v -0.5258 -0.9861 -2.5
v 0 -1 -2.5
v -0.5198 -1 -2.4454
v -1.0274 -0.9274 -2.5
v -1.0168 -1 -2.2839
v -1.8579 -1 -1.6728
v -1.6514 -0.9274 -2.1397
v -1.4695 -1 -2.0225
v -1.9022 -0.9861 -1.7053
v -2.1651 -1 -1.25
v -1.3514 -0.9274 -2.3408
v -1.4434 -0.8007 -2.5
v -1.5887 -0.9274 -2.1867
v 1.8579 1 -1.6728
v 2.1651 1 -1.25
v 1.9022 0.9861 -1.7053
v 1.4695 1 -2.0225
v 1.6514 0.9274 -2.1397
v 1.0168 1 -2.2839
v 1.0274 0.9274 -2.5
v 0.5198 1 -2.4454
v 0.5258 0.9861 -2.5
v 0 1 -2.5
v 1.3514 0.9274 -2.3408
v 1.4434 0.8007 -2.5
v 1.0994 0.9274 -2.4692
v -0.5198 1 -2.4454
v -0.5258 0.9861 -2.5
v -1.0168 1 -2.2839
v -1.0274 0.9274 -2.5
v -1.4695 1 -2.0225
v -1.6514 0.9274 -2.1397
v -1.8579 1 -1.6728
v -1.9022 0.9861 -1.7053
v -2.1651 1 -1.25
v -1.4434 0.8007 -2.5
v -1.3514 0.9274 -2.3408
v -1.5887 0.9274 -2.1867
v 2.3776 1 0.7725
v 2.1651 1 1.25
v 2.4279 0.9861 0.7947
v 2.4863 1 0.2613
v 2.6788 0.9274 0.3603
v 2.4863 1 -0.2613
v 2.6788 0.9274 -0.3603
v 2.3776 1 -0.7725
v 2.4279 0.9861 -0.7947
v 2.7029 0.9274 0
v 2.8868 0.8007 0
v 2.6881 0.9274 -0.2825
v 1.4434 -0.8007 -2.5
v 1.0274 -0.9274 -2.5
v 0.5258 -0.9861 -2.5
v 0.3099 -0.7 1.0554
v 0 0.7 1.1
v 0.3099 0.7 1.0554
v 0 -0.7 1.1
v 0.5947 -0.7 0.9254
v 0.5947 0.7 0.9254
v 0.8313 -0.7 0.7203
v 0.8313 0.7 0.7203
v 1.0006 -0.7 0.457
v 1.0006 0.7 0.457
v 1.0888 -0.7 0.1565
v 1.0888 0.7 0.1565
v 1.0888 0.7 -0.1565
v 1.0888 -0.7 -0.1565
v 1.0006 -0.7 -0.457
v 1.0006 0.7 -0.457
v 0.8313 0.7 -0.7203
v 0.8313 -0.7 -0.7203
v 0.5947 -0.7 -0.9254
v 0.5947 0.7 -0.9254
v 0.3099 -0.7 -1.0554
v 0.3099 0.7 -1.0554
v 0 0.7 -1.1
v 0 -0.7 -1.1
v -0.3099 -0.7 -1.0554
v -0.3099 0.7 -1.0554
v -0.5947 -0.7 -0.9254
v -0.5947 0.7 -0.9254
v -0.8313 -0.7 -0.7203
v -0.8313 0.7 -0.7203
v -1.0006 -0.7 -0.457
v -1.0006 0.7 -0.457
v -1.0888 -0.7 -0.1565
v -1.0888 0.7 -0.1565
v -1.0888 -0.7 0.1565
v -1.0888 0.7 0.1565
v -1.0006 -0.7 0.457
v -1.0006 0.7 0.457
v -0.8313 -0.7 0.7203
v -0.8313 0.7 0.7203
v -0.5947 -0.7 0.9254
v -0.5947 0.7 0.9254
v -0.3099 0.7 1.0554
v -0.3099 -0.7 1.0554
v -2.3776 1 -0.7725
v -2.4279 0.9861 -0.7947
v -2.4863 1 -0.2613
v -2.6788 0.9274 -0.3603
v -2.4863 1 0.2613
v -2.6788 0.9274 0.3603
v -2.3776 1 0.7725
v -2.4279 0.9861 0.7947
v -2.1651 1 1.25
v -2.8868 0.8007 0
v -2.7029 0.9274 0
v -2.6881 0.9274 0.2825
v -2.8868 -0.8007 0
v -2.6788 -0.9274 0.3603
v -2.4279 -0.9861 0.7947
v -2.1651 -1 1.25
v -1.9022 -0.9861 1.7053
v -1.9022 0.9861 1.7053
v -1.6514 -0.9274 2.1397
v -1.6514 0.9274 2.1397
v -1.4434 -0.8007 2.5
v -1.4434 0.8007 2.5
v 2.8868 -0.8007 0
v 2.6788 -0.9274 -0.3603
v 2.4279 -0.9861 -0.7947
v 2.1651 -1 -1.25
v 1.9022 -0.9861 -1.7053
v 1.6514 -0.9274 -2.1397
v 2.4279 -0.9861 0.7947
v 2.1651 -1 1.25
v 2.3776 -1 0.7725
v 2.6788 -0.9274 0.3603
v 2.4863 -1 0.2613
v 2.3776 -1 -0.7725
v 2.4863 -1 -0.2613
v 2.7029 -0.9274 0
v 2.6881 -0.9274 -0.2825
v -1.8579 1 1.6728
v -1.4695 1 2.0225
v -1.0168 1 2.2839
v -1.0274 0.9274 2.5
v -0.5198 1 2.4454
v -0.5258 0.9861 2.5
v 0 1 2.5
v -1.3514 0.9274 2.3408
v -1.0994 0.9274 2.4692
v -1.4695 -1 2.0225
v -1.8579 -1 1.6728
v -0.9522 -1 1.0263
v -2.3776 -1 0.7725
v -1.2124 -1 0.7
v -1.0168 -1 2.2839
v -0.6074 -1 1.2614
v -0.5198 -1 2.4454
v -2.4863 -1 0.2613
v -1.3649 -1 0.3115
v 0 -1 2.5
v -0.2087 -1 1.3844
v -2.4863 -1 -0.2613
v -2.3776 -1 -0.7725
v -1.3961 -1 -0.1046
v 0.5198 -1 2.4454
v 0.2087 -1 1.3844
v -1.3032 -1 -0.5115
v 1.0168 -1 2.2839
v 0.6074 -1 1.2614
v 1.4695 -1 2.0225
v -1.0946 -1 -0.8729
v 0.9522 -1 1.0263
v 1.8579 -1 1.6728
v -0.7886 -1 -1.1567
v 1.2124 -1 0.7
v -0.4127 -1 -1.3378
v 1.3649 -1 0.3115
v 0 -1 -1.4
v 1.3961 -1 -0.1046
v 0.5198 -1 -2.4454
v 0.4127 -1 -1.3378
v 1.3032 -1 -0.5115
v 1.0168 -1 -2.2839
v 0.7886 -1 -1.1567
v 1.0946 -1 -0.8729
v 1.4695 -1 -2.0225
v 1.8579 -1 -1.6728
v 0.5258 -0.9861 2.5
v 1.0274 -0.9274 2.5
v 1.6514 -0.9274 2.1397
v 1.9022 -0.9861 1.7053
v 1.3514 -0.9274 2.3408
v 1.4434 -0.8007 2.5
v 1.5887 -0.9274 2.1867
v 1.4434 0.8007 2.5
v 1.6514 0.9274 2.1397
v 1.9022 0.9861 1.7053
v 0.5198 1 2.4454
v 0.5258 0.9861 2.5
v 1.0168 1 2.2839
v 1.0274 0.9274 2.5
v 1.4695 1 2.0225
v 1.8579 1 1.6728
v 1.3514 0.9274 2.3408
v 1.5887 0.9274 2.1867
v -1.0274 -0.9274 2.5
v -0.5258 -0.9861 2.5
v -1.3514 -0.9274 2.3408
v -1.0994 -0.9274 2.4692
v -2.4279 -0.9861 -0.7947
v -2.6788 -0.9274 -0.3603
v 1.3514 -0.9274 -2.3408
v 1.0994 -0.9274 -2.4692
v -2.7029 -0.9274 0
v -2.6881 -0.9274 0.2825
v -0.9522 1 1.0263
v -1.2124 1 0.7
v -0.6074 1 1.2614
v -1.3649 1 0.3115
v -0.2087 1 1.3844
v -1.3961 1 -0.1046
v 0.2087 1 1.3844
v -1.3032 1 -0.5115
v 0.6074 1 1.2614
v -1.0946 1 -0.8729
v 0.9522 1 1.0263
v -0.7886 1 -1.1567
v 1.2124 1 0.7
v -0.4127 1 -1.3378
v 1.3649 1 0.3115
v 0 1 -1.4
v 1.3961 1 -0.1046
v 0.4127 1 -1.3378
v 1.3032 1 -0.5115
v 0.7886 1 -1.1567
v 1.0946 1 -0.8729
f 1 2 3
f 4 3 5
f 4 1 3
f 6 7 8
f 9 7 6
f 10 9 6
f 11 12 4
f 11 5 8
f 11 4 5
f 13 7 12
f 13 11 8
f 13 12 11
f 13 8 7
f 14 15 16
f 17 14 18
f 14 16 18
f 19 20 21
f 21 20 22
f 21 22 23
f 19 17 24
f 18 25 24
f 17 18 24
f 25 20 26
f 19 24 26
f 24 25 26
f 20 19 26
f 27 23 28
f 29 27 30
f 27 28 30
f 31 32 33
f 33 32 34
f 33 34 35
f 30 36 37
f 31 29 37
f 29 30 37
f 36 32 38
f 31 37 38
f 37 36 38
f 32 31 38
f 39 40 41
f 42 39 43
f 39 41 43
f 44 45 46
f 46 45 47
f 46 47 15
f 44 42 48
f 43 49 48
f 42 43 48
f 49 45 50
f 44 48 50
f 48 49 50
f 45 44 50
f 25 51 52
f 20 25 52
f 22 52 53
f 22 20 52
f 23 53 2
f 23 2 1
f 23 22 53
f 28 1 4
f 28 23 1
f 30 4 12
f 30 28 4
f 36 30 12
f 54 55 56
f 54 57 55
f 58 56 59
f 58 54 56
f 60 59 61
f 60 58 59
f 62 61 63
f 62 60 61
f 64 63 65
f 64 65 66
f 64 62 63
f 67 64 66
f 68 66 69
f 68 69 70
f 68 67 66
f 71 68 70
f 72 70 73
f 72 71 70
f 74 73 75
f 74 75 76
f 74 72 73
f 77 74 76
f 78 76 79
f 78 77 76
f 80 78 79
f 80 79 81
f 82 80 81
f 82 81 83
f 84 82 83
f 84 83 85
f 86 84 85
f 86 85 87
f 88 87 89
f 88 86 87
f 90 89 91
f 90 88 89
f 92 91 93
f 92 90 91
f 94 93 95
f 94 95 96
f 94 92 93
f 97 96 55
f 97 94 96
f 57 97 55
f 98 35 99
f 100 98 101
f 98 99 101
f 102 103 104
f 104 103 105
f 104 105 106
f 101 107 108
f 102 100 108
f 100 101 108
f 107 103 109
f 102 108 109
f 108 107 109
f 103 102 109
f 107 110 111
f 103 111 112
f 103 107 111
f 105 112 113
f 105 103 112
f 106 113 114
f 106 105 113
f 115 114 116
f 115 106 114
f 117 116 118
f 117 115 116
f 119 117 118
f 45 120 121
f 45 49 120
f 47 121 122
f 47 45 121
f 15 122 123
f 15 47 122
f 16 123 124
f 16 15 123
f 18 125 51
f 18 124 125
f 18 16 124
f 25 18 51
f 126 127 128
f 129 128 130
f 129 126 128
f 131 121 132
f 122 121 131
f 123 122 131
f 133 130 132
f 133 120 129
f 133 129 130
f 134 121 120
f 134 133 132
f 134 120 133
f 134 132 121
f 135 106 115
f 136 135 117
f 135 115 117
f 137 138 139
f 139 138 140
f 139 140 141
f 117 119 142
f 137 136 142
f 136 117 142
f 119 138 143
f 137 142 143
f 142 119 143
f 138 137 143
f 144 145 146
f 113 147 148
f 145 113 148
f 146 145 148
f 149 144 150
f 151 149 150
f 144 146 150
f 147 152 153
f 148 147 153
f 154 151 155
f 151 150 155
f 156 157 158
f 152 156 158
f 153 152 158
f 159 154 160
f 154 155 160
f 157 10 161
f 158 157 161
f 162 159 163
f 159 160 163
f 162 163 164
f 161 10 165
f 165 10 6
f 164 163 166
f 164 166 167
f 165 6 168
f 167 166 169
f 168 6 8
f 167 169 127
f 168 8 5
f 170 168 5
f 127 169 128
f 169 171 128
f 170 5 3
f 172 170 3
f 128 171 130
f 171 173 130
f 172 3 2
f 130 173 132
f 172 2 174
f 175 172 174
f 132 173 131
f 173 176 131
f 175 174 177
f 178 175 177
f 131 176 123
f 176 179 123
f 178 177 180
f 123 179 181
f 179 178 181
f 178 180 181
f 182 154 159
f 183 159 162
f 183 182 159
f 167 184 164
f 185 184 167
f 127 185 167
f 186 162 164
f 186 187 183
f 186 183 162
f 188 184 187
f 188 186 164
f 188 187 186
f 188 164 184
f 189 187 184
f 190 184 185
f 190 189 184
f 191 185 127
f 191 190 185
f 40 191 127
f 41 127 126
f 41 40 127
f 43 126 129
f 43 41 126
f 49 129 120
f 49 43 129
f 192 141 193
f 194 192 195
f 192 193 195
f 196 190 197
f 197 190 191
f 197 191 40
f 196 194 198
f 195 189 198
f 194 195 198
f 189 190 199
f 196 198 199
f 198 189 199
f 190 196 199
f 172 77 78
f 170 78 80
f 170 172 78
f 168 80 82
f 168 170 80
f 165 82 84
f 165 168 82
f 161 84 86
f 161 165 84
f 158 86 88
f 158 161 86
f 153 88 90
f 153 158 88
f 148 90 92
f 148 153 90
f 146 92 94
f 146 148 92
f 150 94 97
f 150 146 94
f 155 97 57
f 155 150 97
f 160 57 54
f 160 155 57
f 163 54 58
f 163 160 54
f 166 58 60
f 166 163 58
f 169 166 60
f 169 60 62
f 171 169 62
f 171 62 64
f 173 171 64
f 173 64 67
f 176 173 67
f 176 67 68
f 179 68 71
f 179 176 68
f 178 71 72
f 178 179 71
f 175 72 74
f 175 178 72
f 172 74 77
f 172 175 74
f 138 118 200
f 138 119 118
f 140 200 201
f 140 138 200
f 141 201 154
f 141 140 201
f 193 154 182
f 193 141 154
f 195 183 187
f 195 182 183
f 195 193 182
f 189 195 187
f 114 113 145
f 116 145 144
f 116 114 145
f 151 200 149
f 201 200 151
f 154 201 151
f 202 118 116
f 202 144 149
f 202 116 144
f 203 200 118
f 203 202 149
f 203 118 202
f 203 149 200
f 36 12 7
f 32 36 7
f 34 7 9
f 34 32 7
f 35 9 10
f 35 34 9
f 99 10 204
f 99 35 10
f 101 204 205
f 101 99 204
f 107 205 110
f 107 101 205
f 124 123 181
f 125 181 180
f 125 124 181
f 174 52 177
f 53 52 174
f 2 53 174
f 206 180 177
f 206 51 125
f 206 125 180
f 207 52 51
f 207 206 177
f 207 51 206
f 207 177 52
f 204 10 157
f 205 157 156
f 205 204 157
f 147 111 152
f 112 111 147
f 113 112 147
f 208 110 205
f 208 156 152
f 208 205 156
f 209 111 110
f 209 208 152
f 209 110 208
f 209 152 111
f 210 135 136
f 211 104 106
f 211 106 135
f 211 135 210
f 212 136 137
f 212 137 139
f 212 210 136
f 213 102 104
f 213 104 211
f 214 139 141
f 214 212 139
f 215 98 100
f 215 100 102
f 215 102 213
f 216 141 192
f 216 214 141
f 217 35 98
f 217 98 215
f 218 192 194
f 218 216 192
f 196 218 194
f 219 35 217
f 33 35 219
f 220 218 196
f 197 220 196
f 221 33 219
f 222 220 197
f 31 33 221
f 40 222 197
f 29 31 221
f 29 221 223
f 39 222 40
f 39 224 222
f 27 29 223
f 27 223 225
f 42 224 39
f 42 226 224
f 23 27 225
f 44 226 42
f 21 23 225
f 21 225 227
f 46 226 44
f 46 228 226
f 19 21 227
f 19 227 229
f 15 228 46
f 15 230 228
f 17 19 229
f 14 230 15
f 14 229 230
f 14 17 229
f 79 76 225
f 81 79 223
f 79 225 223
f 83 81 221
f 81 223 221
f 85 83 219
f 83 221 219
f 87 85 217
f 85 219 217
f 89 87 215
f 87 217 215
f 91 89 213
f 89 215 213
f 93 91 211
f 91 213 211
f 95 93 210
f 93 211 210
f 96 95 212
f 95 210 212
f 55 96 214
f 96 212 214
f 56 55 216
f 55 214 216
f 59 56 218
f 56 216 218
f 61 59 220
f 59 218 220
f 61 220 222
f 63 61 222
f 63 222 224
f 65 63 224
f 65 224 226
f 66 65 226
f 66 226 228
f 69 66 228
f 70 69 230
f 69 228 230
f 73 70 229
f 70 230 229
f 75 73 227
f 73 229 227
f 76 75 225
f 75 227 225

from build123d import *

# Parameters (mm, degrees)
SKETCH1_R           = 1.1
BOSS_EXTRUDE1_DEPTH = 1


with BuildPart() as part:
    # Sketch1 → Boss-Extrude1 (new, symmetric)
    with BuildSketch(Plane(origin=(0, 0, 0), x_dir=(1, 0, 0), z_dir=(0, 1, 0))):
        Polygon((2.886751346, 0), (1.443375673, 2.5), (-1.443375673, 2.5), (-2.886751346, 0), (-1.443375673, -2.5), (1.443375673, -2.5), align=None)
        with Locations(Location((0, 0, 0), (0, 0, 270))):
            Circle(SKETCH1_R, mode=Mode.SUBTRACT)
    extrude(amount=BOSS_EXTRUDE1_DEPTH, both=True)

    # Sketch2 → Cut-Revolve1 (revolve, cut)
    with BuildSketch(Plane.XY, mode=Mode.PRIVATE) as cut_revolve1_sk:
        with BuildLine():
            Line((-2.886751346, 0.800688001), (-2.886751346, 1))
            Line((-2.886751346, 1), (-2.5, 1))
            ThreePointArc((-2.5, 1), (-2.706403757, 0.925624109), (-2.886751346, 0.800688001))
        make_face()
        Polygon((-1.4, 1), (-1.1, 1), (-1.1, 0.7), align=None)
        with BuildLine():
            Line((-2.886751346, -0.800688001), (-2.886751346, -1))
            Line((-2.886751346, -1), (-2.5, -1))
            ThreePointArc((-2.5, -1), (-2.706403757, -0.925624109), (-2.886751346, -0.800688001))
        make_face()
    cut_revolve1 = revolve(cut_revolve1_sk.sketch.rotate(Axis((0, 0, 0), (0, 1, 0)), 270), axis=Axis((0, 0, 0), (0, 1, 0)), mode=Mode.SUBTRACT)

    # Mirror1: Cut-Revolve1 across plane
    add(cut_revolve1.mirror(Plane.ZX), mode=Mode.SUBTRACT)


solid = part.part
